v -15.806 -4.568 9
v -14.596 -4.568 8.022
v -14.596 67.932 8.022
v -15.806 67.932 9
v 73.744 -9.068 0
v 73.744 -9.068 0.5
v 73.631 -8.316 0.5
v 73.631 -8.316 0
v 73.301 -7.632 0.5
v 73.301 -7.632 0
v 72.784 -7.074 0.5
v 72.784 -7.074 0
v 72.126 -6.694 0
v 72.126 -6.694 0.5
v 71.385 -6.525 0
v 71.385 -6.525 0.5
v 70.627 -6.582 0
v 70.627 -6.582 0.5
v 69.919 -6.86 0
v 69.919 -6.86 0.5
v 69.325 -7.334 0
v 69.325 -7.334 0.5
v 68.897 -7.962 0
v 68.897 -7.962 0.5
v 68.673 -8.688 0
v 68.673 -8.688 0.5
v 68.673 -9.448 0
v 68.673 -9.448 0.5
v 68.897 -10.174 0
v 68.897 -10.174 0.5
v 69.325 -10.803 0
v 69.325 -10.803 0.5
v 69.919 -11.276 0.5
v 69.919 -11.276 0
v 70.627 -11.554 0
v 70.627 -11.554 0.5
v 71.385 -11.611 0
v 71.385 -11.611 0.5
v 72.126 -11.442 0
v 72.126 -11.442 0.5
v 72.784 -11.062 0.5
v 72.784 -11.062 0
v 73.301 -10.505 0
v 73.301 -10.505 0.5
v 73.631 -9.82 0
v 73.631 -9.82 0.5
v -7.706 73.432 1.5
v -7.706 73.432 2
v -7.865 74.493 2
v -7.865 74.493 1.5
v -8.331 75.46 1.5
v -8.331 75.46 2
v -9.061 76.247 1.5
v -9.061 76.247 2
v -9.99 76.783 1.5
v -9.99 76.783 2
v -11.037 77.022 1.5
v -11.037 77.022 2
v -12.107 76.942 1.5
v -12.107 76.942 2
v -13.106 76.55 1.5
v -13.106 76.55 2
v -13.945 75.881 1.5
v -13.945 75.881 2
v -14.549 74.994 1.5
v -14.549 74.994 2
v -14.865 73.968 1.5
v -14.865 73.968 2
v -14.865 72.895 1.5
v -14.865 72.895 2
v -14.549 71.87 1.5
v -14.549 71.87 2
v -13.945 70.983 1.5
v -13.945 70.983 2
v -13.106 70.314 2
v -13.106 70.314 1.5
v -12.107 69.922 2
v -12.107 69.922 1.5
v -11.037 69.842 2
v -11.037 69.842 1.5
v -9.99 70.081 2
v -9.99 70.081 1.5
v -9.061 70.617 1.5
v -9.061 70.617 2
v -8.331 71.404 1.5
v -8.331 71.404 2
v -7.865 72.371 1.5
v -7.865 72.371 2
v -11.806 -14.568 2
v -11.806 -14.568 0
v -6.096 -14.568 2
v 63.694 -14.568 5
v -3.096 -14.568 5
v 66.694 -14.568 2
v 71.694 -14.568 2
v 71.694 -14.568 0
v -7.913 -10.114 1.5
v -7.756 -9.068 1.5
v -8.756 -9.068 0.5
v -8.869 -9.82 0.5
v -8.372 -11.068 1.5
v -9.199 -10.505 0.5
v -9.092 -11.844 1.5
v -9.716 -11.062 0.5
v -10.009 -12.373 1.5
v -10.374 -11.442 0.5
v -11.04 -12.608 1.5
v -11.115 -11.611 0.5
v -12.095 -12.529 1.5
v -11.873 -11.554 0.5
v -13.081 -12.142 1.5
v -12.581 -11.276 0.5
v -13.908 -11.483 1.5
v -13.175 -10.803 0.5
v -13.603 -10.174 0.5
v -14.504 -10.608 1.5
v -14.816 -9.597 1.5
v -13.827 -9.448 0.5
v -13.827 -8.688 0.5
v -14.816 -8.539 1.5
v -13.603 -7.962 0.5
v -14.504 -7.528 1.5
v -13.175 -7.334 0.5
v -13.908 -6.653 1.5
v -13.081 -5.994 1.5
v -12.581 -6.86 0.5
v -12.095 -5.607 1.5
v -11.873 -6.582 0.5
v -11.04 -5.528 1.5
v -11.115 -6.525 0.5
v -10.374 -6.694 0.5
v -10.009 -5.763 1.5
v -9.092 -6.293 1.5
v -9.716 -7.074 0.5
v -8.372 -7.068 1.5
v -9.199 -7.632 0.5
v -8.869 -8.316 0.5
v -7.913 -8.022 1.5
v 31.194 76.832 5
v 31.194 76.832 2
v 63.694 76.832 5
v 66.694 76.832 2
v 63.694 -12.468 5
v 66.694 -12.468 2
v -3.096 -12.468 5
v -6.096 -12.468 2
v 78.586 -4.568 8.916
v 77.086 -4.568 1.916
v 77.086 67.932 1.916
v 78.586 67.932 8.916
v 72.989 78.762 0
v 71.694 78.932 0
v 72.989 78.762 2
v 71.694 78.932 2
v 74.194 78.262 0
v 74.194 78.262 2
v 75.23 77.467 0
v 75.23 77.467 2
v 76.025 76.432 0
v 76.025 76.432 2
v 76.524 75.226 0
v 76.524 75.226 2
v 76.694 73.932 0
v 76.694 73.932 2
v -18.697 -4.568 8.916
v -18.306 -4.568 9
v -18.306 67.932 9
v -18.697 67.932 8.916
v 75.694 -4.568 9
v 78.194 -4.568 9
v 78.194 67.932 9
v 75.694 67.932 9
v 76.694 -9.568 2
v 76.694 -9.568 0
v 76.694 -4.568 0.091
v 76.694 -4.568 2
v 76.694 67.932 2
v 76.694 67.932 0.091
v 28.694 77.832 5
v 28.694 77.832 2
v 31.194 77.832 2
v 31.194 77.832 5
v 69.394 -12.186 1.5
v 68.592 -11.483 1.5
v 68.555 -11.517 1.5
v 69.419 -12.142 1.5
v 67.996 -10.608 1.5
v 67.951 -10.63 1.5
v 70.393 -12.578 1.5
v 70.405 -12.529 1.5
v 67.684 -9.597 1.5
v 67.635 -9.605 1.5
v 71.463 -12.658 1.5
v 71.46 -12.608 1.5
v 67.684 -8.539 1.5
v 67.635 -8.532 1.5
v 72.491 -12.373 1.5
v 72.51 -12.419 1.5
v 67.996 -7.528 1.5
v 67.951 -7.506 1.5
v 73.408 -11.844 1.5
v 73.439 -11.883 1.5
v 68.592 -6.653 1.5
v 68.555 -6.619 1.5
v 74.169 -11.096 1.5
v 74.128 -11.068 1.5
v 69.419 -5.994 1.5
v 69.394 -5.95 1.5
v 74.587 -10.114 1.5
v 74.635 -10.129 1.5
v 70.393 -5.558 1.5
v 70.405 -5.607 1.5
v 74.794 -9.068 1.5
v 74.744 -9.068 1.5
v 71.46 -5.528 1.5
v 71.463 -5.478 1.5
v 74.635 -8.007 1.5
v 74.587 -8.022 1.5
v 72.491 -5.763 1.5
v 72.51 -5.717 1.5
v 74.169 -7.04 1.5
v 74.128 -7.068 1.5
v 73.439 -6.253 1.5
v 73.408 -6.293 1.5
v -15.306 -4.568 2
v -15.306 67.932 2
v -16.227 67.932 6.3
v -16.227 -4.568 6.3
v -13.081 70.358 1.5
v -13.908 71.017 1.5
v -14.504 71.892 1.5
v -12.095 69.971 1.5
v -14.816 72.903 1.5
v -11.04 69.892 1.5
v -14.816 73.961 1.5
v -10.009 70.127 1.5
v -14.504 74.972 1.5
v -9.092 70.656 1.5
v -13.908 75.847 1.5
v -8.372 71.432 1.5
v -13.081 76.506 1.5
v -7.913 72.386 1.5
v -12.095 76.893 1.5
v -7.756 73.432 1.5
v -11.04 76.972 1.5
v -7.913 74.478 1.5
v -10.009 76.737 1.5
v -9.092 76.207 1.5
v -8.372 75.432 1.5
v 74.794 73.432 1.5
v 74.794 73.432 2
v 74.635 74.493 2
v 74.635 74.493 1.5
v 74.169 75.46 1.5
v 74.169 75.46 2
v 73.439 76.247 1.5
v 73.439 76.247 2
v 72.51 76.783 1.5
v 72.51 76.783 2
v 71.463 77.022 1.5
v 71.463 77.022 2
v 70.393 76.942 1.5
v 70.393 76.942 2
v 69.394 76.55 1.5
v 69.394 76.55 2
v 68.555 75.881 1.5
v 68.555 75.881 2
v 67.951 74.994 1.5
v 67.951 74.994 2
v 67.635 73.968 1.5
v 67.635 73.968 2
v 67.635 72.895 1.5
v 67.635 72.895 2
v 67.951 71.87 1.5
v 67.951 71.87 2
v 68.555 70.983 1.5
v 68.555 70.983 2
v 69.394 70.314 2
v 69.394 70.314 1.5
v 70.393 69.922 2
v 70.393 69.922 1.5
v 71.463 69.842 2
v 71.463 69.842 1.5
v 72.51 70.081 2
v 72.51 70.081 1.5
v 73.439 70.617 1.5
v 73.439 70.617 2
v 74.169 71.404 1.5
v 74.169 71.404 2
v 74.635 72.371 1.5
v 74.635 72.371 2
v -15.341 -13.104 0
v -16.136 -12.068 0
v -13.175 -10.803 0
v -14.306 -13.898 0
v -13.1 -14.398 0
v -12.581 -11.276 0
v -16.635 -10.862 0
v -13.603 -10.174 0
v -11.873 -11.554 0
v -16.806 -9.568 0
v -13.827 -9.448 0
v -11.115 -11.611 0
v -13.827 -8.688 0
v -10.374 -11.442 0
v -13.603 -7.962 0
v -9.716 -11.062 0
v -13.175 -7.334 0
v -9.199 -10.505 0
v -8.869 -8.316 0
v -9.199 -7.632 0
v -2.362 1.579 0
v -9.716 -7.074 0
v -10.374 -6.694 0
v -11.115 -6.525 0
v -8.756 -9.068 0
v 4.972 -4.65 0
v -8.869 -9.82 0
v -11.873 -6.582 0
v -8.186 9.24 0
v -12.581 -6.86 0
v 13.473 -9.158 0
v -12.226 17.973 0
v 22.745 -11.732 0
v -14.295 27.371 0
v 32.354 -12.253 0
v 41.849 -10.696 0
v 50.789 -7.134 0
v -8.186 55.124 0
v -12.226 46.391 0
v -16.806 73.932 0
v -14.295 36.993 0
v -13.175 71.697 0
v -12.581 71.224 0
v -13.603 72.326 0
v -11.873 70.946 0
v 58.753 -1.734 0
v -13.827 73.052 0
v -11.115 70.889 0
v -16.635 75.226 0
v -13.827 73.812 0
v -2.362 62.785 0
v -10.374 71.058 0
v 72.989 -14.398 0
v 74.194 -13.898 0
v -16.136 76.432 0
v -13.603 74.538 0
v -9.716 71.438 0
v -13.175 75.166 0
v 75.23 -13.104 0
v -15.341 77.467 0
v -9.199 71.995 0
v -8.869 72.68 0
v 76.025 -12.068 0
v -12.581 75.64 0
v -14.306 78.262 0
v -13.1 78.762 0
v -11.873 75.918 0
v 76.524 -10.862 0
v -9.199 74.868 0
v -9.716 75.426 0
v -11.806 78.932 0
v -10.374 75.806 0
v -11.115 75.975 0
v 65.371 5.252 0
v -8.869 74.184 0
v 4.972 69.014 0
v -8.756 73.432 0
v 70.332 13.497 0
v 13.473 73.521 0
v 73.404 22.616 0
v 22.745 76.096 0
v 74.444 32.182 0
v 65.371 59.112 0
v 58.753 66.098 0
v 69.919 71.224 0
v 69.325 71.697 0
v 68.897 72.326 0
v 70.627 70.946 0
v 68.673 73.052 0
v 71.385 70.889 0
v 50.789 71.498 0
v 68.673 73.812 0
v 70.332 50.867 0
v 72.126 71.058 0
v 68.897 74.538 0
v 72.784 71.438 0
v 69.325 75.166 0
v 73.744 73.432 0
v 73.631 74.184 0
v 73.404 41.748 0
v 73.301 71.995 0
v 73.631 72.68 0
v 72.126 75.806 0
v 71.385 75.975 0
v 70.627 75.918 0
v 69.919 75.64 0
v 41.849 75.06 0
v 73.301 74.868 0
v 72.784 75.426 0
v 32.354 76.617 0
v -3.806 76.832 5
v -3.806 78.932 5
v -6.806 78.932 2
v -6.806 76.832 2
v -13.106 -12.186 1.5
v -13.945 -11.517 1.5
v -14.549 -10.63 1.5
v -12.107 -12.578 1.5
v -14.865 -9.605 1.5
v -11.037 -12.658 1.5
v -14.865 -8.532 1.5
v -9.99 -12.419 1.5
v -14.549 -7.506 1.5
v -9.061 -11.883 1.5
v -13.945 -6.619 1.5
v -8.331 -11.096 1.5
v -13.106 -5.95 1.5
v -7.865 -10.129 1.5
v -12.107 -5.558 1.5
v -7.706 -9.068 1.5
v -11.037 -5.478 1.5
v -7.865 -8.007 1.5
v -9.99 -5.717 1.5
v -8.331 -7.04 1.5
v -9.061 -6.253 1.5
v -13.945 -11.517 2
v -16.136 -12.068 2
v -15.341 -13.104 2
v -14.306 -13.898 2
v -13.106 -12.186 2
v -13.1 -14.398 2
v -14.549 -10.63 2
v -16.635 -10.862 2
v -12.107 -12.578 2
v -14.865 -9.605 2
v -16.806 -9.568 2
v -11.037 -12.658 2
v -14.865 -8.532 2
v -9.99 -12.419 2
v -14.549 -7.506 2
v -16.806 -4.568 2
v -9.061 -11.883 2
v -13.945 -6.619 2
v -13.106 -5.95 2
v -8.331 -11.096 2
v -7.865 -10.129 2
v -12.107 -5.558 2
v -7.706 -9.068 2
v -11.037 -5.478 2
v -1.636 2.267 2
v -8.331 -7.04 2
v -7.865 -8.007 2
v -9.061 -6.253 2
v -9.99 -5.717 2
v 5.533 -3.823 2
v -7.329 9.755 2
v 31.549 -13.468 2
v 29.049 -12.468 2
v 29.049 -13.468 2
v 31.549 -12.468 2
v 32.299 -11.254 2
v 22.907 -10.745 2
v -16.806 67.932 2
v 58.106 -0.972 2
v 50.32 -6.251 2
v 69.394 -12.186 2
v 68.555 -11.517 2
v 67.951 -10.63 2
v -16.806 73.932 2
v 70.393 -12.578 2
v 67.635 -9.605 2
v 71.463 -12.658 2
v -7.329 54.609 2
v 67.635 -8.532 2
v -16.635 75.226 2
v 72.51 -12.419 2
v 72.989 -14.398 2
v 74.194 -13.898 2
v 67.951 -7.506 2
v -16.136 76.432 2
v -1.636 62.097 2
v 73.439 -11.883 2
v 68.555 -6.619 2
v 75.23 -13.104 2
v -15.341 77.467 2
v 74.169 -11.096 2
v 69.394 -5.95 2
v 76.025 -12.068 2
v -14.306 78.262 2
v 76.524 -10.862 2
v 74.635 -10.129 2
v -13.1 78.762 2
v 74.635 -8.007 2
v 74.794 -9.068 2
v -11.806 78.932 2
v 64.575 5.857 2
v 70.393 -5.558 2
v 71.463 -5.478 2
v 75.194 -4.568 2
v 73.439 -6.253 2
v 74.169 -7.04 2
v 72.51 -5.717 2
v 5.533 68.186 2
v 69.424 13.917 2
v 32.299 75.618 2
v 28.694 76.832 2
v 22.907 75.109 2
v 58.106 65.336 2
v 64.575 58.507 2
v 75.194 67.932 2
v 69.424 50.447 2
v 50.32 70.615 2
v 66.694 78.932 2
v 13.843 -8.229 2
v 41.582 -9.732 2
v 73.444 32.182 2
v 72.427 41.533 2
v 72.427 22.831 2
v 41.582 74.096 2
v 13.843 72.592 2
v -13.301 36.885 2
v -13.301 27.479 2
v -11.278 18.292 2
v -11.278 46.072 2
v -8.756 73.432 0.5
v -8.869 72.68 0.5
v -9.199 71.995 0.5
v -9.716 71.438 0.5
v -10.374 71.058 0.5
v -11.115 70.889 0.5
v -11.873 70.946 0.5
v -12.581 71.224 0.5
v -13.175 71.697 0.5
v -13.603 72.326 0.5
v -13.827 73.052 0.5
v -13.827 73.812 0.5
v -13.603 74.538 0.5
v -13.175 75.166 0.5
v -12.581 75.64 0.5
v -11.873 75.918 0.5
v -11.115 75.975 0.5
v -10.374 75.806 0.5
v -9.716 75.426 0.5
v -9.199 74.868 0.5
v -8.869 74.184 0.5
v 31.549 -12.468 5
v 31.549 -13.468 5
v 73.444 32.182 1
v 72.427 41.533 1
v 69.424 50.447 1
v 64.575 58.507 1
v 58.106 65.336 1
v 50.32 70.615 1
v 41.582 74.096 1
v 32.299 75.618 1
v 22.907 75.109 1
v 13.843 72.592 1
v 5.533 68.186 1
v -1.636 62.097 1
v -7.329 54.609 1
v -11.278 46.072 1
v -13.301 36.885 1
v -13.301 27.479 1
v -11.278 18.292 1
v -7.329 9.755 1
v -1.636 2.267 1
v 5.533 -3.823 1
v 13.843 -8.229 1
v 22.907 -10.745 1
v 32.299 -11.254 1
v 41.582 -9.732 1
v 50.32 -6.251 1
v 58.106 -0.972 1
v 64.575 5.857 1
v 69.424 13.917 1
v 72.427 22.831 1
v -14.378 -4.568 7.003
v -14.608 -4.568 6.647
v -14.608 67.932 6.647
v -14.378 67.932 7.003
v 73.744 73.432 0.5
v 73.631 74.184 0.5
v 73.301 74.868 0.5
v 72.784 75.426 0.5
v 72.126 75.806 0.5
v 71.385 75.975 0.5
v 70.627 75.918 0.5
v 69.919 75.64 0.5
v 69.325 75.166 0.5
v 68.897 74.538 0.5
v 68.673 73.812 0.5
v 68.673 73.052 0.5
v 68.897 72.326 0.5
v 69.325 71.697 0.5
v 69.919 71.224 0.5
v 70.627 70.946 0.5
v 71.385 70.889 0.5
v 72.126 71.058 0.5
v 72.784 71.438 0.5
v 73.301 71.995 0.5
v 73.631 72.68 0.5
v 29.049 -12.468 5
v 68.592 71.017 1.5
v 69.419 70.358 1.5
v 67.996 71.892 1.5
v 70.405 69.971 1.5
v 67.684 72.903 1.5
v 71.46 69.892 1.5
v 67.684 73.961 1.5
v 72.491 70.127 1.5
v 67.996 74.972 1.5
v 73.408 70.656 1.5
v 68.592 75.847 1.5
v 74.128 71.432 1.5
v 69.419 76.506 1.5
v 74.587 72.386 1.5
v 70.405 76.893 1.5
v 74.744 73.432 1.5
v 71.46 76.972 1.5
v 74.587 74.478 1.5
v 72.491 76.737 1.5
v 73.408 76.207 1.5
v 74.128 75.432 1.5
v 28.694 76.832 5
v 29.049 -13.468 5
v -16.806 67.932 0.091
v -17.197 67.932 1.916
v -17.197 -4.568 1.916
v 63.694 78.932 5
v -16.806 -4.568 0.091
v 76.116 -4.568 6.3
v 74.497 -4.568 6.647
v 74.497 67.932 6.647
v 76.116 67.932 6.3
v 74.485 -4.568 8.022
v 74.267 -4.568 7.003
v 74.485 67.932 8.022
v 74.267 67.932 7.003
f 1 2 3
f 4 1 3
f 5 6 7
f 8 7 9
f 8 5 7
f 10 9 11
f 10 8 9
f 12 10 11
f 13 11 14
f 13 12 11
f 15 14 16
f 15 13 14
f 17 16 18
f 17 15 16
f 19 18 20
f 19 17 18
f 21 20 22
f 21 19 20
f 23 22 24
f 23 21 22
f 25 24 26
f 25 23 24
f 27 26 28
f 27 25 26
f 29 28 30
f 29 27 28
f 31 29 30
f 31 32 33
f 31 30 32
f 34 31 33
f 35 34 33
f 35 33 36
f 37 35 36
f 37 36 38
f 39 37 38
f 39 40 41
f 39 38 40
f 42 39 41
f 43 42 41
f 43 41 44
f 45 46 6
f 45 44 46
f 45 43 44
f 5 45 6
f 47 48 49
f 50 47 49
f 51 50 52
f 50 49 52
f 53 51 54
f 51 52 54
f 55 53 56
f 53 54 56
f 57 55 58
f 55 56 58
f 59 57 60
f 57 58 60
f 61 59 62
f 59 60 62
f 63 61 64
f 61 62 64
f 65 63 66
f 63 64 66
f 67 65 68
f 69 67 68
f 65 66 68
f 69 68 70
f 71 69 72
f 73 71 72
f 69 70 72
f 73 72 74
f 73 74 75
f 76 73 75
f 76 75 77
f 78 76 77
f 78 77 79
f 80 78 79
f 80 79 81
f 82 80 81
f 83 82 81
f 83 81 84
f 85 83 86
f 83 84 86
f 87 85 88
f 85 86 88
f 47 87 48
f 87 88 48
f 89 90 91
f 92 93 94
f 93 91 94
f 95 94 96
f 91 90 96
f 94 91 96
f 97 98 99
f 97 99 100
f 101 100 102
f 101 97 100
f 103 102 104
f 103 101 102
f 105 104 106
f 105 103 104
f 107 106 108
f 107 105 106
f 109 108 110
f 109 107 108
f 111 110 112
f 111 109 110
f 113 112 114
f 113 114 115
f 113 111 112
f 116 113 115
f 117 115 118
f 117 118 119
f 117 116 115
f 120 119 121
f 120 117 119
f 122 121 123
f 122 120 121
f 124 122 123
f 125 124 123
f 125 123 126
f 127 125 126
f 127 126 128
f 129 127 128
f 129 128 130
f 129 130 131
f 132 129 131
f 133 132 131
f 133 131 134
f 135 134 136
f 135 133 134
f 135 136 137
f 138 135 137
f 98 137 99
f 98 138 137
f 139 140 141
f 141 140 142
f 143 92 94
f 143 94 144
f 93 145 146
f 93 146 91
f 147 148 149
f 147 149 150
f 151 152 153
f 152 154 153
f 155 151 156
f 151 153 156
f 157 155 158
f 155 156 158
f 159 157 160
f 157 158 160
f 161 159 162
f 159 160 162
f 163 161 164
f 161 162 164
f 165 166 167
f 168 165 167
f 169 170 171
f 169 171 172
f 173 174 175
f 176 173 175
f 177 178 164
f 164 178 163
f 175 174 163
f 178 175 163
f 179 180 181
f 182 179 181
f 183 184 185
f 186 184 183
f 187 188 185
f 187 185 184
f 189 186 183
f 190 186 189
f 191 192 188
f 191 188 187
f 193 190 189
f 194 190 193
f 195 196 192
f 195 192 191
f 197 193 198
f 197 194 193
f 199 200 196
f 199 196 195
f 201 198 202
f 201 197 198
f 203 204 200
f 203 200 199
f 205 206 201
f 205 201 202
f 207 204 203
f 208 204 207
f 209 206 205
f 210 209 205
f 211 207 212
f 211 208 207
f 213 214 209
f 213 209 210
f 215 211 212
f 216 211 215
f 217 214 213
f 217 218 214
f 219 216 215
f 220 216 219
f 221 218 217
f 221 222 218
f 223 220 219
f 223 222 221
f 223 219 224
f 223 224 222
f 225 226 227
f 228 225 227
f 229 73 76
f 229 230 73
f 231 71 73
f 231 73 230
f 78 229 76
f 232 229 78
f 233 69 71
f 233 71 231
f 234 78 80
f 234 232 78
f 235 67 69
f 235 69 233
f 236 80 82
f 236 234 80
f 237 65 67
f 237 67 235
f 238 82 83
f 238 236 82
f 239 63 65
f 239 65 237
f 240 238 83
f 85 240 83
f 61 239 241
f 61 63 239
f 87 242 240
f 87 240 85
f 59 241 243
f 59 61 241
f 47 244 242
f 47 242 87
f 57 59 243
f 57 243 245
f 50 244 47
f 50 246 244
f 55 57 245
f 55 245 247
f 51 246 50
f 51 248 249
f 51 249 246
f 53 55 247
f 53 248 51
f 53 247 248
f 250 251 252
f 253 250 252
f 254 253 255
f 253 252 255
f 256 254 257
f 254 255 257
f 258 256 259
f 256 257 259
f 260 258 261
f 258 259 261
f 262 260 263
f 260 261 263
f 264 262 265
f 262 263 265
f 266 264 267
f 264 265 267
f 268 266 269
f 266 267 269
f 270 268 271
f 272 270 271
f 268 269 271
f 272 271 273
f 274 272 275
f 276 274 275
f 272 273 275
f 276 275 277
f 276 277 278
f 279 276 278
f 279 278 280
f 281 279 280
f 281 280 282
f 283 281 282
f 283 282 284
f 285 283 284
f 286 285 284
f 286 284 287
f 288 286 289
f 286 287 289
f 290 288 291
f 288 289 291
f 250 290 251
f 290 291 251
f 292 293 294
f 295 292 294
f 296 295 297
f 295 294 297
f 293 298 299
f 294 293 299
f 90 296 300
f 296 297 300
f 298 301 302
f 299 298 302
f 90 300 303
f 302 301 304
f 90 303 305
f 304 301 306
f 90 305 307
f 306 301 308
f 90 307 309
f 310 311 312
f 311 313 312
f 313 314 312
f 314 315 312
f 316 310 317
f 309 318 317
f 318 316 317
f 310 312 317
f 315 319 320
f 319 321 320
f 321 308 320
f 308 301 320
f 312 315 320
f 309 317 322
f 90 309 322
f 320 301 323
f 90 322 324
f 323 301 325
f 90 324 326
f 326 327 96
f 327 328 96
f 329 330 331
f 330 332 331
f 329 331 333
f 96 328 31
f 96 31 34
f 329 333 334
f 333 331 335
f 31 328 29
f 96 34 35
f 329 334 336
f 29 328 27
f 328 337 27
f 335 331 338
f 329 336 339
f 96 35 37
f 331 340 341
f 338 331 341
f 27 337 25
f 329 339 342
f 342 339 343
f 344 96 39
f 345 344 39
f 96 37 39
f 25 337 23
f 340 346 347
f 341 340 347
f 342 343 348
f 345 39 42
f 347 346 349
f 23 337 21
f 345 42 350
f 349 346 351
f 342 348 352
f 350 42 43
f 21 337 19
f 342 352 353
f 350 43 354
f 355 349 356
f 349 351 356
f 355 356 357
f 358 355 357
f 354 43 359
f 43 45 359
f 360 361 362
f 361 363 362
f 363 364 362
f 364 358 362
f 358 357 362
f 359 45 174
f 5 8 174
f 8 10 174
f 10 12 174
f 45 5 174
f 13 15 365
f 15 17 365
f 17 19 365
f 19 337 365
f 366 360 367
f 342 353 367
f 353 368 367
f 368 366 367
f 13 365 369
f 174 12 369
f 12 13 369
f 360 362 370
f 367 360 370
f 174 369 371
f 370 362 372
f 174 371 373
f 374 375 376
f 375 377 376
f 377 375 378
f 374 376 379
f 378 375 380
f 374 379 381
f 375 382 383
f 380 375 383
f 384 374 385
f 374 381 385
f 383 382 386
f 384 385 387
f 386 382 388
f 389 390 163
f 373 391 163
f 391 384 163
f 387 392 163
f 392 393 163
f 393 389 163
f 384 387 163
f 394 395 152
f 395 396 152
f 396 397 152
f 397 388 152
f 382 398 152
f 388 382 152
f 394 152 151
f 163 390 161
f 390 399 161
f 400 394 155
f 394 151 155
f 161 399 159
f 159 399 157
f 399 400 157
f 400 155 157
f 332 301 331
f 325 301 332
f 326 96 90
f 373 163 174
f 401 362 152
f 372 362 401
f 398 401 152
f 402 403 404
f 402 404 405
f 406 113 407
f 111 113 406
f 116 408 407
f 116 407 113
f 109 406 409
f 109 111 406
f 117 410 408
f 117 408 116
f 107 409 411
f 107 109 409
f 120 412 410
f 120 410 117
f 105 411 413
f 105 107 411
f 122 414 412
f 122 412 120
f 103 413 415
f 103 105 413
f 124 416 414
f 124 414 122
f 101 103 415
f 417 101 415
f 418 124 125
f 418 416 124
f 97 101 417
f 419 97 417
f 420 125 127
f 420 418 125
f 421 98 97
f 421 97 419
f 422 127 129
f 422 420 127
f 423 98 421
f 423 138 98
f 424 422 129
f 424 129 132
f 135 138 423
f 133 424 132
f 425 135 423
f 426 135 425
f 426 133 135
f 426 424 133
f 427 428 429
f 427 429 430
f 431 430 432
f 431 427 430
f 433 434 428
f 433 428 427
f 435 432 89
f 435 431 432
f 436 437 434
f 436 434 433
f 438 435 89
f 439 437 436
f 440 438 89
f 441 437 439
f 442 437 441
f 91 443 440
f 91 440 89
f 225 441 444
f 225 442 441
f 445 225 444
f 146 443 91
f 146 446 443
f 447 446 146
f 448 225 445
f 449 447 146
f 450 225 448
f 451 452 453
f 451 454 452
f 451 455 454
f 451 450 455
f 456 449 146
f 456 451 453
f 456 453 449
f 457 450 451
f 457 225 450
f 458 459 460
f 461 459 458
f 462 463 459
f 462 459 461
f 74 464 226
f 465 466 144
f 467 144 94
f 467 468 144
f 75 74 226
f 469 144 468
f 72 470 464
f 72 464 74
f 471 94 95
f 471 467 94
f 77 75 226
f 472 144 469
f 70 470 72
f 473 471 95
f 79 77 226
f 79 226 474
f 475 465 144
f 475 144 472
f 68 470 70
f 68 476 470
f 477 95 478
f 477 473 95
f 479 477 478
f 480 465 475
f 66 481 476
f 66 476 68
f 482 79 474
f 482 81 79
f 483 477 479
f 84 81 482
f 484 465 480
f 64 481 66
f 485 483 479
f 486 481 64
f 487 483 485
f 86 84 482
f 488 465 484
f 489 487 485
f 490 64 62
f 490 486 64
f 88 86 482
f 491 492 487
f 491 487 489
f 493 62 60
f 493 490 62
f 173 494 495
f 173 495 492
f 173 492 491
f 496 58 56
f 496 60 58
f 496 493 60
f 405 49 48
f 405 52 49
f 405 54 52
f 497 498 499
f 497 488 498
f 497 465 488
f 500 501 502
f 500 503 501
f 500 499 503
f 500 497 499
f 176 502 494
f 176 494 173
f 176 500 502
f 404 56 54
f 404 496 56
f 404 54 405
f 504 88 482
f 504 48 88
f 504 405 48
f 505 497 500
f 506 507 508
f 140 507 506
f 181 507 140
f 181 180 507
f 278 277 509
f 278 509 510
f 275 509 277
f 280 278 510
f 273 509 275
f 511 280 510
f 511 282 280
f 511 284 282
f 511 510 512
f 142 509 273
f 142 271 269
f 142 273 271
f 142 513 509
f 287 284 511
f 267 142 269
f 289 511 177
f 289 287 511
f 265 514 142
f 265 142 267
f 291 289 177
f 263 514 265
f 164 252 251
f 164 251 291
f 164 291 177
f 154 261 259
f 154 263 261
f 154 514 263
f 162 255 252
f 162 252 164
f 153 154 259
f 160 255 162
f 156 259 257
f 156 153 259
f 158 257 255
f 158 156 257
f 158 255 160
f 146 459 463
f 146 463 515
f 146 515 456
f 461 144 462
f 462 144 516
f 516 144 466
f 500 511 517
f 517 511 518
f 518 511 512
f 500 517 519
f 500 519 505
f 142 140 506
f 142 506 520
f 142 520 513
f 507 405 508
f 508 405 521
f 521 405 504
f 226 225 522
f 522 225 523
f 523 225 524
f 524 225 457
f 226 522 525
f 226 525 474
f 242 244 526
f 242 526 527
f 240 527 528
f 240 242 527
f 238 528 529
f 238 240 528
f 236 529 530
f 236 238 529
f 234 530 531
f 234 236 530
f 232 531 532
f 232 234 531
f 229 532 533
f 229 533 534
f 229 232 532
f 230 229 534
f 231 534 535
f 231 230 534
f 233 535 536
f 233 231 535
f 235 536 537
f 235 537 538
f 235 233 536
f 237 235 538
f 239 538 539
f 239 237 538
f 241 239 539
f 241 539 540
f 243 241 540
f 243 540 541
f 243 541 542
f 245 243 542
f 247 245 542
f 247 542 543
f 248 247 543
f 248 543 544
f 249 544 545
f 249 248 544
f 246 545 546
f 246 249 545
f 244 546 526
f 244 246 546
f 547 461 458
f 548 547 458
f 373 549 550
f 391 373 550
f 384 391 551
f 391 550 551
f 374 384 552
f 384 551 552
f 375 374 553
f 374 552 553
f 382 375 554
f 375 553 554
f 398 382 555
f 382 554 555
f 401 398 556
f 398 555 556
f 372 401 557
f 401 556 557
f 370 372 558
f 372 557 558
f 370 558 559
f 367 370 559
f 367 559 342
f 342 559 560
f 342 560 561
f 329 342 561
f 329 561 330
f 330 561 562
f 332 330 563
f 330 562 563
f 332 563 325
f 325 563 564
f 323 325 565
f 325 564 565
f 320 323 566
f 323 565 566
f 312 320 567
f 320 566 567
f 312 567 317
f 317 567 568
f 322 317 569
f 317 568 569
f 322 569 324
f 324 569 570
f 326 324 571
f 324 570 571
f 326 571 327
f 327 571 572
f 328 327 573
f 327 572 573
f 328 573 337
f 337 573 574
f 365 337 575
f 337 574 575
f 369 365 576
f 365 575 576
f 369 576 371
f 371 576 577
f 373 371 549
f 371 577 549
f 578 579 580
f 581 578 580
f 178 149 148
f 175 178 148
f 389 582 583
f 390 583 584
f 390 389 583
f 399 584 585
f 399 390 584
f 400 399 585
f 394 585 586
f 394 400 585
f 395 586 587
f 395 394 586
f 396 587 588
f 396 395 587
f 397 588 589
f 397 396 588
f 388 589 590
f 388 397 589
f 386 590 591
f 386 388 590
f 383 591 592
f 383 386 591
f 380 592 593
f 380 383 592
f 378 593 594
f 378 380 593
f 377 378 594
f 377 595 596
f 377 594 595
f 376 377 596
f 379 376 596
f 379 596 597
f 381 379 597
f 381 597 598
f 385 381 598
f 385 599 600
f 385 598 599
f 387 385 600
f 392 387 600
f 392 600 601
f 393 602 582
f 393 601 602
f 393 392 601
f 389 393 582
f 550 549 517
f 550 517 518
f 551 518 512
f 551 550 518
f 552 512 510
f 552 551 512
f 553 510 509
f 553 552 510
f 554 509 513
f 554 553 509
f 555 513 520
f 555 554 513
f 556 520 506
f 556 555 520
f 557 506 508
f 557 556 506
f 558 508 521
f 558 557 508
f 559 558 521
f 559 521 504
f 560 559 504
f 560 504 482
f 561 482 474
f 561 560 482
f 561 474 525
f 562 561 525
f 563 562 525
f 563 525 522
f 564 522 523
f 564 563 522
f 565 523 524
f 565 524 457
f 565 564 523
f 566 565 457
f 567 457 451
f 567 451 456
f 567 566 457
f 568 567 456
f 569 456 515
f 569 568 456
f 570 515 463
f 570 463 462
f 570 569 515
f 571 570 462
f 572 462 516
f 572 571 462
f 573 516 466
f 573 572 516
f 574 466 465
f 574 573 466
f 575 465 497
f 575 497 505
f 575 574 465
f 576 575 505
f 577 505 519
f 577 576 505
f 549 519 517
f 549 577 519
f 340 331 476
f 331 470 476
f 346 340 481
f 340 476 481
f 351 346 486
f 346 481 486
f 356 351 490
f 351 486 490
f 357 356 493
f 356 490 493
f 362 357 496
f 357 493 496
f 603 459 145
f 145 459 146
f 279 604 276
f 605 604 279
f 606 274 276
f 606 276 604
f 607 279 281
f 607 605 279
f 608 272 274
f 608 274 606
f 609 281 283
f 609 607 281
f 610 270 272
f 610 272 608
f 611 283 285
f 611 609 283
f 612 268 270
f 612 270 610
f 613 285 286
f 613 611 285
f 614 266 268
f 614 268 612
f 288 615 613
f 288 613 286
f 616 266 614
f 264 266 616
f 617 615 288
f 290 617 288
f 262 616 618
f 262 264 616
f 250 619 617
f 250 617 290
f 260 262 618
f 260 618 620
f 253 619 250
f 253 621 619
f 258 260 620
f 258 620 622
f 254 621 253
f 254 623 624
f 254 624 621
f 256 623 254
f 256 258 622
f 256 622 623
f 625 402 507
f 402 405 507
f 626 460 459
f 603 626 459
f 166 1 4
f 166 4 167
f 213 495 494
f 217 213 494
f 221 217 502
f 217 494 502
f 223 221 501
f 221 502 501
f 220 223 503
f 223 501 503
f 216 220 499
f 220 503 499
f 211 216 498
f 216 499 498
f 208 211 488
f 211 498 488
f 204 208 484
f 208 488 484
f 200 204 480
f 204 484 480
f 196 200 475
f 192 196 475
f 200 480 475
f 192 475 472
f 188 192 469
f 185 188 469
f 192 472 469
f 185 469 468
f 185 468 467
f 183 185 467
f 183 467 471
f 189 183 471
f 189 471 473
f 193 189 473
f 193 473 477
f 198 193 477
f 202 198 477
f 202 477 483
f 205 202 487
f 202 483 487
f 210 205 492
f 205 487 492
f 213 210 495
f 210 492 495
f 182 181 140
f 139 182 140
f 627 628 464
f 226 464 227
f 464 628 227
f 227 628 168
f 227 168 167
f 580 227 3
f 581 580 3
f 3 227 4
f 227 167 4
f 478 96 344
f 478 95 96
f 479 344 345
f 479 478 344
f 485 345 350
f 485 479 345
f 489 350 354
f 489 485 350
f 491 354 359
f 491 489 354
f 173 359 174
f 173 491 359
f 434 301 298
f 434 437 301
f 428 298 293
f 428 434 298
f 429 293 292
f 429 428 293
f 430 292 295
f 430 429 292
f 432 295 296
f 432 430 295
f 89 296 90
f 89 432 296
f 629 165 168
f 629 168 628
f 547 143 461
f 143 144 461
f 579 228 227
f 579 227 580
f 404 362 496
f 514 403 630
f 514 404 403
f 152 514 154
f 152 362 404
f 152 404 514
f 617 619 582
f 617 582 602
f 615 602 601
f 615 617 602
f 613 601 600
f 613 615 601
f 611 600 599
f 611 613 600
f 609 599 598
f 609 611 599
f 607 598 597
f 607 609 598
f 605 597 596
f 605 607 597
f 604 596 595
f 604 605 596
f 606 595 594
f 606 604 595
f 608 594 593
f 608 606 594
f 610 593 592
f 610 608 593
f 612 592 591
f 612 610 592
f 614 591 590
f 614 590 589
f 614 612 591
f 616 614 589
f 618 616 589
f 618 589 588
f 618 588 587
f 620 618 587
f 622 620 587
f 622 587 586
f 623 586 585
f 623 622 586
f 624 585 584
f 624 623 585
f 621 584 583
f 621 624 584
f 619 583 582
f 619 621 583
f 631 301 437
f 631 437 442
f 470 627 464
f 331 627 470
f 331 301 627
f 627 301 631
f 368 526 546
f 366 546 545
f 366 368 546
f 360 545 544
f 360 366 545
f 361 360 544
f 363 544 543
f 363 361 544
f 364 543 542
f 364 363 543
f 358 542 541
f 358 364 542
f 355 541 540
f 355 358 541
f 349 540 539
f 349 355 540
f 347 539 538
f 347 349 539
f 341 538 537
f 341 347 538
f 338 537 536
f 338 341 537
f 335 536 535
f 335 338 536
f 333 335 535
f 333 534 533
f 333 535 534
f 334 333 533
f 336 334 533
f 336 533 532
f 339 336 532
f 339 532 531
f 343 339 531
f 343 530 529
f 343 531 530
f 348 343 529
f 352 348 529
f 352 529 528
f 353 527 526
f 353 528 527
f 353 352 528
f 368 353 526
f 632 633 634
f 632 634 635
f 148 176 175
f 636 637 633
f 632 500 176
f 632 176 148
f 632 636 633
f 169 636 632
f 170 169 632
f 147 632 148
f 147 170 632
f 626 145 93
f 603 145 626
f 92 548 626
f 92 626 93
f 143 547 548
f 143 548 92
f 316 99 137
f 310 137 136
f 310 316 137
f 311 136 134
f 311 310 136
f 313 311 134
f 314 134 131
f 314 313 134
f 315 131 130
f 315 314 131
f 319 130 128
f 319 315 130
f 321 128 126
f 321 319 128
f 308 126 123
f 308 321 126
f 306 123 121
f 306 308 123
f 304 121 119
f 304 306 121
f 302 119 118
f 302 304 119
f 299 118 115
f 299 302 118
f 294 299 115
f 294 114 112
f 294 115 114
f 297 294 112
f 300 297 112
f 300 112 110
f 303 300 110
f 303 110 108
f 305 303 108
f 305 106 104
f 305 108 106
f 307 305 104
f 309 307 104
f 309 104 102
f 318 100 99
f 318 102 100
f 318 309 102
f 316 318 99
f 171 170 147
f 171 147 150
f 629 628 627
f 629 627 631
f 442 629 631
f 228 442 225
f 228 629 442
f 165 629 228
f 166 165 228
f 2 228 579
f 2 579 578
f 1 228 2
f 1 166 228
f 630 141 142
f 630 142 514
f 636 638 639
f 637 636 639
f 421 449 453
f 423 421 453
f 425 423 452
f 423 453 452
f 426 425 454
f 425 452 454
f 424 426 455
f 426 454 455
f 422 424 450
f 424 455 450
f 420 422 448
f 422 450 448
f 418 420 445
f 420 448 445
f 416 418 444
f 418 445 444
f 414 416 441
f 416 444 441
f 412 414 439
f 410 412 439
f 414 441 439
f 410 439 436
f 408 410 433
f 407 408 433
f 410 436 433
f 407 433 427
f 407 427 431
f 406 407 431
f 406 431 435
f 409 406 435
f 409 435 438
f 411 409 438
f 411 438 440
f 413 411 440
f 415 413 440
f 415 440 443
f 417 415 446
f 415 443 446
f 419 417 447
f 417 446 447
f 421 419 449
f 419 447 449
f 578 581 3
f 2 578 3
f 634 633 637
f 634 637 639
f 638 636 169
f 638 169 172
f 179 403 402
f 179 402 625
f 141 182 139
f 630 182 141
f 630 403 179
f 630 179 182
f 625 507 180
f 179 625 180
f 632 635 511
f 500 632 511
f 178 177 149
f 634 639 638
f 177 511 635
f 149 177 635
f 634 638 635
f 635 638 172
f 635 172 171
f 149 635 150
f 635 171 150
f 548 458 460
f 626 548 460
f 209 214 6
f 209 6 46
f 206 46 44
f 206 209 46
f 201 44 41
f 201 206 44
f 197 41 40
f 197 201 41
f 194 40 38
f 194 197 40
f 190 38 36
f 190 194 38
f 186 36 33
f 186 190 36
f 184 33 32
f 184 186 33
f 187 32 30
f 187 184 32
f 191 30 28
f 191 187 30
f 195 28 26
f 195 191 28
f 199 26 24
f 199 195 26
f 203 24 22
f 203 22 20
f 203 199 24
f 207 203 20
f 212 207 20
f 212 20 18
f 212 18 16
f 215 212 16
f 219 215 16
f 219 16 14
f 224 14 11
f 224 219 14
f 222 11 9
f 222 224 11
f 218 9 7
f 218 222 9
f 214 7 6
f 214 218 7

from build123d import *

# Parameters (mm, degrees)
F0_W       = 93.5
F0_H       = 93.5
F0_R       = 2.55
F0_R_2     = 43.5
F1_DEPTH   = 2
F3_START   = -10
F3_DEPTH   = 72.5
F4_SIZE    = 1
F6_DEPTH   = 3
F7_SIZE    = 2.99999
F8_R       = 3.6
F9_DEPTH   = 0.5
F10_SIZE   = 1
F11_R      = 5
F12_SIZE   = 1
F13_SIZE   = 0.3
F14_DEPTH  = 0.4
F15_DEPTH  = 0.4
F15_FACE_W = 0.4
F15_FACE_H = 72.5
F14_FACE_W = 0.4
F14_FACE_H = 72.5


# Not quite as in the source:
# - a fillet or chamfer is up to 0.001 mm smaller than in the source, because OpenCascade refuses the exact size


with BuildPart() as f1:
    # F0 (on Top) → F1 (new body)
    with BuildSketch(Plane.XY):
        with Locations((29.9444539048, 32.1819351325)):
            Rectangle(F0_W, F0_H)
        with Locations((-11.3055460952, -9.0680648675)):
            Circle(F0_R, mode=Mode.SUBTRACT)
        with Locations((71.1944539048, -9.0680648675)):
            Circle(F0_R, mode=Mode.SUBTRACT)
        with Locations((29.9444539048, 32.1819351325)):
            Circle(F0_R_2, mode=Mode.SUBTRACT)
        with Locations((-11.3055460952, 73.4319351325)):
            Circle(F0_R, mode=Mode.SUBTRACT)
        with Locations((71.1944539048, 73.4319351325)):
            Circle(F0_R, mode=Mode.SUBTRACT)
    extrude(amount=F1_DEPTH)

    # F2 (on face) → F3 (join)
    with BuildSketch(Plane.XZ.offset(14.5680648675).offset(F3_START)):
        Polygon((-16.8055460952, 9), (-16.2269746666, 6.3), (-14.3147795447, 6.7097560976), (-14.8055460952, 9), align=None)
        Polygon((-16.8055460952, 2), (-15.3055460952, 2), (-16.2269746666, 6.3), (-16.8055460952, 9), (-18.3055460952, 9), align=None)
        Polygon((76.1158824762, 6.3), (75.1944539048, 2), (76.6944539048, 2), (78.1944539048, 9), (76.6944539048, 9), align=None)
        Polygon((74.2036873543, 6.7097560976), (76.1158824762, 6.3), (76.6944539048, 9), (74.6944539048, 9), align=None)
    extrude(amount=-F3_DEPTH)

    # F4
    f4_edges = [f1.edges().sort_by_distance(p)[0] for p in [
        (-14.805546, 31.681935, 9),
        (74.694454, 31.681935, 9),
    ]]
    chamfer(f4_edges, length=F4_SIZE)

    # F5 (on face) → F6 (join)
    with BuildSketch(Plane.XY.offset(2)):
        Polygon((-6.0960170065, -14.5680648675), (66.6944539048, -14.5680648675), (66.6944539048, -12.4680648675), (31.5492184492, -12.4680648675), (31.5492184492, -13.4680648675), (29.0492184492, -13.4680648675), (29.0492184492, -12.4680648675), (-6.0960170065, -12.4680648675), align=None)
        Polygon((66.6944539048, 76.8319351325), (66.6944539048, 78.9319351325), (-6.8055460952, 78.9319351325), (-6.8055460952, 76.8319351325), (28.6944539048, 76.8319351325), (28.6944539048, 77.8319351325), (31.1944539048, 77.8319351325), (31.1944539048, 76.8319351325), align=None)
    extrude(amount=F6_DEPTH)

    # F7 (size 3 in the source; OpenCascade refuses exactly that, so slightly less here)
    f7_edges = [f1.edges().sort_by_distance(p)[0] for p in [
        (66.694454, -13.518065, 5),
        (-6.096017, -13.518065, 5),
        (-6.805546, 77.881935, 5),
        (66.694454, 77.881935, 5),
    ]]
    chamfer(f7_edges, length=F7_SIZE)

    # F8 (on face) → F9 (cut)
    with BuildSketch(Plane.XY.offset(2)):
        with Locations((-11.3055460952, -9.0680648675)):
            Circle(F8_R)
        with Locations((71.1944539048, -9.0680648675)):
            Circle(F8_R)
        with Locations((71.1944539048, 73.4319351325)):
            Circle(F8_R)
        with Locations((-11.3055460952, 73.4319351325)):
            Circle(F8_R)
    extrude(amount=-F9_DEPTH, mode=Mode.SUBTRACT)

    # F10
    f10_edges = [f1.edges().sort_by_distance(p)[0] for p in [
        (-13.855546, -9.068065, 1.5),
        (68.644454, -9.068065, 1.5),
        (68.644454, 73.431935, 1.5),
        (-13.855546, 73.431935, 1.5),
    ]]
    chamfer(f10_edges, length=F10_SIZE)

    # F11
    f11_edges = [f1.edges().sort_by_distance(p)[0] for p in [
        (-16.805546, 78.931935, 1),
        (-16.805546, -14.568065, 1),
        (76.694454, -14.568065, 1),
        (76.694454, 78.931935, 1),
    ]]
    fillet(f11_edges, radius=F11_R)

    # F12
    f12_edges = [f1.edges().sort_by_distance(p)[0] for p in [
        (-13.555546, 32.181935, 0),
    ]]
    chamfer(f12_edges, length=F12_SIZE)

    # F13
    f13_edges = [f1.edges().sort_by_distance(p)[0] for p in [
        (-14.31478, 31.681935, 6.709756),
        (74.203687, 31.681935, 6.709756),
    ]]
    chamfer(f13_edges, length=F13_SIZE)

    # F14 (add): a face of the model
    f14_faces = [f1.faces().sort_by_distance(p)[0] for p in [
        (-17.5555460952, 31.6819351325, 5.5),
    ]]
    extrude(f14_faces, amount=F14_DEPTH)

    # F15 (add): a face of the model
    f15_faces = [f1.faces().sort_by_distance(p)[0] for p in [
        (77.4444539048, 31.6819351325, 5.5),
    ]]
    extrude(f15_faces, amount=F15_DEPTH)

    # F15_face (on face) → F16 (join, up to the next surface of F1)
    with BuildSketch(Plane(origin=(76.8900143876, 31.6819351325, 1.9580941823), x_dir=(1, 0, 0), z_dir=(-0.2095290887, 0, -0.9778024141))):
        Rectangle(F15_FACE_W, F15_FACE_H)
    extrude(until=Until.NEXT)

    # F14_face (on face) → F17 (join, up to the next surface of F1)
    with BuildSketch(Plane(origin=(-17.001106578, 31.6819351325, 1.9580941823), x_dir=(1, 0, 0), z_dir=(0.2095290887, 0, -0.9778024141))):
        Rectangle(F14_FACE_W, F14_FACE_H)
    extrude(until=Until.NEXT)


solid = f1.part
